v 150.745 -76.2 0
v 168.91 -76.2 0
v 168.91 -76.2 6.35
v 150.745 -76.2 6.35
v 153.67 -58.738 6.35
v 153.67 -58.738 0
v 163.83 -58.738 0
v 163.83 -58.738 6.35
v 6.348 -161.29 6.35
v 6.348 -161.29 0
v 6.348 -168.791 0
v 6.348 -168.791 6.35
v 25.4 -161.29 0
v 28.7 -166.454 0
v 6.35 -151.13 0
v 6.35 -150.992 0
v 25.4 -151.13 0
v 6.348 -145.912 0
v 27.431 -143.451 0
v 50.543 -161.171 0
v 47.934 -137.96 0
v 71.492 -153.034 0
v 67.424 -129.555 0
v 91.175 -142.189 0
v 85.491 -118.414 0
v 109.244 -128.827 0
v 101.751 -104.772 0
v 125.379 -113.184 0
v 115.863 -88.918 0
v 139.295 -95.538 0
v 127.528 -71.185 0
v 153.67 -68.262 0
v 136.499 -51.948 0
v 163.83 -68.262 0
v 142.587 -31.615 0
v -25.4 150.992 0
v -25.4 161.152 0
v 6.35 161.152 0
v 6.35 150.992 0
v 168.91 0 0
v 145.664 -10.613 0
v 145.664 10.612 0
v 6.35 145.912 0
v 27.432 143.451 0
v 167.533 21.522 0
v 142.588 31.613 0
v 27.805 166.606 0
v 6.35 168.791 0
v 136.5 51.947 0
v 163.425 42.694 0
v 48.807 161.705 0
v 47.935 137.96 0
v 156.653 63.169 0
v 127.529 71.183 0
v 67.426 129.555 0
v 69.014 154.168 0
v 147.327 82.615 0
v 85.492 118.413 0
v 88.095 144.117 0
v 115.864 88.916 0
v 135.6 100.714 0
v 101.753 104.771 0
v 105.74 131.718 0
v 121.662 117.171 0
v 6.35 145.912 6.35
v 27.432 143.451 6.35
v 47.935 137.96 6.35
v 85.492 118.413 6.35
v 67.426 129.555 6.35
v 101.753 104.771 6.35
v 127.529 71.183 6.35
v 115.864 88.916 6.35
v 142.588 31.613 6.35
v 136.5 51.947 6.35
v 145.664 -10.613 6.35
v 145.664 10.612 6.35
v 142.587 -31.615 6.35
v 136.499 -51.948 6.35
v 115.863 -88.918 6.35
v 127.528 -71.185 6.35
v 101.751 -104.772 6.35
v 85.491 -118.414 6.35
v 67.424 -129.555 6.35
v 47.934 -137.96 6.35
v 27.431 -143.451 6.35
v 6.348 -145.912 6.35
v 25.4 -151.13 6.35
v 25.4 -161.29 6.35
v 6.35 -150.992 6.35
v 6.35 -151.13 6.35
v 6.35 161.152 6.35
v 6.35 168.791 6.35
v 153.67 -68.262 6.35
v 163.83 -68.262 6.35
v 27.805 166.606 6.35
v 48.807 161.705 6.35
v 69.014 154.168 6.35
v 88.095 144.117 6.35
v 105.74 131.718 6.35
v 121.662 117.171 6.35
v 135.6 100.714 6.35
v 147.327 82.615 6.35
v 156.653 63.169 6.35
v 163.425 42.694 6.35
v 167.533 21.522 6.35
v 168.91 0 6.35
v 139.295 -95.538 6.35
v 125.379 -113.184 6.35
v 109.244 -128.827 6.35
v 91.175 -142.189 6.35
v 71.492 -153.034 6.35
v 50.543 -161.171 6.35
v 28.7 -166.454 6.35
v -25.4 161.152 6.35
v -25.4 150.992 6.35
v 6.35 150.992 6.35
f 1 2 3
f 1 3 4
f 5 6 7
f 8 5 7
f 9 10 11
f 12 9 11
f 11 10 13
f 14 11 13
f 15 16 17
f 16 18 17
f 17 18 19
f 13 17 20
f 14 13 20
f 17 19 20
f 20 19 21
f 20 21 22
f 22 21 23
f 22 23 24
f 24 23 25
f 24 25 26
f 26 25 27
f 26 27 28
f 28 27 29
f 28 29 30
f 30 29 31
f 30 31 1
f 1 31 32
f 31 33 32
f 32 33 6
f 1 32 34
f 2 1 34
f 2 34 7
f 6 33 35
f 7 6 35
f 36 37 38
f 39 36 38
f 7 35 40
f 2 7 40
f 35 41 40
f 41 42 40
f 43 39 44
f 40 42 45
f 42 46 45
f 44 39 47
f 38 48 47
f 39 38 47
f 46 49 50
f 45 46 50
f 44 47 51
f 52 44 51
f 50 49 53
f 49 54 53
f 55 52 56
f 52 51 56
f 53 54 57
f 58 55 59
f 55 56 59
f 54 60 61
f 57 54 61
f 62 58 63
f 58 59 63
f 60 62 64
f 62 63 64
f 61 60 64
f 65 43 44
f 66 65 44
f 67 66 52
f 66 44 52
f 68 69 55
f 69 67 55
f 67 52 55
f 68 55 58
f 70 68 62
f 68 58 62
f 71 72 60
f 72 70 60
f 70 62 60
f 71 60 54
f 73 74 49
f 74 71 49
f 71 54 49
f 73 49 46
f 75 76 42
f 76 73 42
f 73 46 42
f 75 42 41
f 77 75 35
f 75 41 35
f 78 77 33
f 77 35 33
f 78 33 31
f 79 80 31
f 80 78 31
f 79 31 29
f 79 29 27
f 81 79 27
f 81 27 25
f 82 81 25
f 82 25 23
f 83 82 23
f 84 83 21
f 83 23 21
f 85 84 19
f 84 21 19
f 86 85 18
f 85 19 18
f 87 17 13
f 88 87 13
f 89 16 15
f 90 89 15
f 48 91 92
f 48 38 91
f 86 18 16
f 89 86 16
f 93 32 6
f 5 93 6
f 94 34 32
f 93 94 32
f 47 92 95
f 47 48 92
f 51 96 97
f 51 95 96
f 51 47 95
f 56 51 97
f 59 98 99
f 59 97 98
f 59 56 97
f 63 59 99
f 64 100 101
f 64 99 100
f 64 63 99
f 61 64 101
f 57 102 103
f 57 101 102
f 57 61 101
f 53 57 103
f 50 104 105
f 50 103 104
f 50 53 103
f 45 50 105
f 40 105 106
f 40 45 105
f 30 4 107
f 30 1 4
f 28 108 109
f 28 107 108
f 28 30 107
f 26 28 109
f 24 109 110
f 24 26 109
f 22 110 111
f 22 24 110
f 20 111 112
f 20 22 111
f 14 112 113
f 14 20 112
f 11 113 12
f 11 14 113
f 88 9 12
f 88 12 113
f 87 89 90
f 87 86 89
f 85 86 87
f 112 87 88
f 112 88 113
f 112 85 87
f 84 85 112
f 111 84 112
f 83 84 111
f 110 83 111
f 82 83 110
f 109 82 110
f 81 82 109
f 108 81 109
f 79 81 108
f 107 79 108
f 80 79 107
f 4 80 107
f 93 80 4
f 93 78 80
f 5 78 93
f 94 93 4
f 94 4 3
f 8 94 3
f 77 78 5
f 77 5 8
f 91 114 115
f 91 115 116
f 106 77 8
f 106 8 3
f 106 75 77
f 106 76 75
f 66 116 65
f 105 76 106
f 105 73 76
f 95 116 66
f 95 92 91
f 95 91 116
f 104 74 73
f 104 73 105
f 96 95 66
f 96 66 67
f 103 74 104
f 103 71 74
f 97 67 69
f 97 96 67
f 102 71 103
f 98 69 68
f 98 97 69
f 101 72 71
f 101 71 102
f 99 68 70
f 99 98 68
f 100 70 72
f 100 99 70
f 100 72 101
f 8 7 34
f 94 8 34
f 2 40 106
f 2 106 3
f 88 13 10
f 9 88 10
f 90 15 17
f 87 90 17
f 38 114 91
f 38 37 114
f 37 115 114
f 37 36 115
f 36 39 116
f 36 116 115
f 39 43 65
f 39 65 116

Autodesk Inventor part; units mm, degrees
ref_plane "YZ Plane" through (0, 0, 0) normal (1, 0, 0) x (0, 1, 0)
ref_plane "XZ Plane" through (0, 0, 0) normal (0, 1, 0) x (-1, 0, 0)
ref_plane "XY Plane" through (0, 0, 0) normal (0, 0, 1) x (1, 0, 0)
sketch "Sketch1" plane through (0, 0, 0) normal (0, 0, 1) x (1, 0, 0)
  arc A0 (6.3485, -145.912) -> (6.35, 145.9119) centre (0, 0) ccw
  line L0 (6.35, -150.9919) -> (6.35, -151.13)
  line L1 (6.35, 145.9119) -> (6.35, 168.7906)
  line L2 (0, 0) -> (0, 200.5264) construction
  line L3 (6.35, 145.9119) -> (6.35, 150.9919) construction
  line L4 (6.35, 150.9919) -> (-25.4, 150.9919)
  line L5 (-25.4, 150.9919) -> (-25.4, 161.1519)
  line L6 (-25.4, 161.1519) -> (6.35, 161.1519)
  line L7 (0, -146.05) -> (0, 0) construction
  line L8 (168.91, 0) -> (168.91, -76.2)
  line L9 (168.91, -76.2) -> (150.7453, -76.2)
  line L10 (0, 0) -> (0, -63.5) construction
  line L11 (0, -63.5) -> (158.75, -63.5) construction
  line L12 (158.75, -58.7375) -> (163.83, -58.7375)
  line L13 (163.83, -58.7375) -> (163.83, -68.2625)
  line L14 (163.83, -68.2625) -> (153.67, -68.2625)
  line L15 (153.67, -68.2625) -> (153.67, -58.7375)
  line L16 (153.67, -58.7375) -> (158.75, -58.7375)
  arc A1 (6.3485, -168.7907) -> (150.7453, -76.2) centre (0, 0) ccw
  line L17 (6.35, 161.1519) -> (-6.35, 161.1519) construction
  line L18 (-6.35, 161.1519) -> (-6.35, 168.7906) construction
  line L19 (0, -146.05) -> (0, -151.13) construction
  line L20 (6.3485, -151.13) -> (25.4, -151.13)
  line L21 (25.4, -151.13) -> (25.4, -161.29)
  line L22 (25.4, -161.29) -> (6.3485, -161.29)
  arc A2 (168.91, 0) -> (6.35, 168.7906) centre (0, 0) ccw
  line L23 (0, -146.05) -> (6.3485, -145.912) construction
  line L24 (6.3485, -145.912) -> (6.3485, -151.13)
  line L25 (6.3485, -161.29) -> (6.3485, -168.7907)
  line L26 (6.3485, -145.912) -> (6.3485, -151.13) construction
  line L27 (6.3485, -161.29) -> (6.3485, -184.4747) construction
  point P0 (6.35, -145.9119)
  point P1 (0.0447, 168.91)
  point P2 (6.3947, 145.9099)
  dimension "d51" = 292.1
  dimension "d72" = 6.35
  dimension "d73" = 5.08
  dimension "d75" = 31.75
  dimension "d76" = 10.16
  dimension "d82" = 76.2
  dimension "d86" = 63.5
  dimension "d87" = 158.75
  dimension "d89" = 4.7625
  dimension "d90" = 5.08
  dimension "d91" = 9.525
  dimension "d92" = 10.16
  dimension "d93" = 4.7625
  dimension "d100" = 12.7
  dimension "d101" = 5.08
  dimension "d103" = 25.4
  dimension "d104" = 10.16
  dimension "d105" = 6.35
  dimension "d106" = 7.5007
  dimension "d107" = 25.4
extrude "Extrusion18" add sketch "Sketch1" along normal blind 6.35
properties part number "TopmaleHoopSection_v2"
